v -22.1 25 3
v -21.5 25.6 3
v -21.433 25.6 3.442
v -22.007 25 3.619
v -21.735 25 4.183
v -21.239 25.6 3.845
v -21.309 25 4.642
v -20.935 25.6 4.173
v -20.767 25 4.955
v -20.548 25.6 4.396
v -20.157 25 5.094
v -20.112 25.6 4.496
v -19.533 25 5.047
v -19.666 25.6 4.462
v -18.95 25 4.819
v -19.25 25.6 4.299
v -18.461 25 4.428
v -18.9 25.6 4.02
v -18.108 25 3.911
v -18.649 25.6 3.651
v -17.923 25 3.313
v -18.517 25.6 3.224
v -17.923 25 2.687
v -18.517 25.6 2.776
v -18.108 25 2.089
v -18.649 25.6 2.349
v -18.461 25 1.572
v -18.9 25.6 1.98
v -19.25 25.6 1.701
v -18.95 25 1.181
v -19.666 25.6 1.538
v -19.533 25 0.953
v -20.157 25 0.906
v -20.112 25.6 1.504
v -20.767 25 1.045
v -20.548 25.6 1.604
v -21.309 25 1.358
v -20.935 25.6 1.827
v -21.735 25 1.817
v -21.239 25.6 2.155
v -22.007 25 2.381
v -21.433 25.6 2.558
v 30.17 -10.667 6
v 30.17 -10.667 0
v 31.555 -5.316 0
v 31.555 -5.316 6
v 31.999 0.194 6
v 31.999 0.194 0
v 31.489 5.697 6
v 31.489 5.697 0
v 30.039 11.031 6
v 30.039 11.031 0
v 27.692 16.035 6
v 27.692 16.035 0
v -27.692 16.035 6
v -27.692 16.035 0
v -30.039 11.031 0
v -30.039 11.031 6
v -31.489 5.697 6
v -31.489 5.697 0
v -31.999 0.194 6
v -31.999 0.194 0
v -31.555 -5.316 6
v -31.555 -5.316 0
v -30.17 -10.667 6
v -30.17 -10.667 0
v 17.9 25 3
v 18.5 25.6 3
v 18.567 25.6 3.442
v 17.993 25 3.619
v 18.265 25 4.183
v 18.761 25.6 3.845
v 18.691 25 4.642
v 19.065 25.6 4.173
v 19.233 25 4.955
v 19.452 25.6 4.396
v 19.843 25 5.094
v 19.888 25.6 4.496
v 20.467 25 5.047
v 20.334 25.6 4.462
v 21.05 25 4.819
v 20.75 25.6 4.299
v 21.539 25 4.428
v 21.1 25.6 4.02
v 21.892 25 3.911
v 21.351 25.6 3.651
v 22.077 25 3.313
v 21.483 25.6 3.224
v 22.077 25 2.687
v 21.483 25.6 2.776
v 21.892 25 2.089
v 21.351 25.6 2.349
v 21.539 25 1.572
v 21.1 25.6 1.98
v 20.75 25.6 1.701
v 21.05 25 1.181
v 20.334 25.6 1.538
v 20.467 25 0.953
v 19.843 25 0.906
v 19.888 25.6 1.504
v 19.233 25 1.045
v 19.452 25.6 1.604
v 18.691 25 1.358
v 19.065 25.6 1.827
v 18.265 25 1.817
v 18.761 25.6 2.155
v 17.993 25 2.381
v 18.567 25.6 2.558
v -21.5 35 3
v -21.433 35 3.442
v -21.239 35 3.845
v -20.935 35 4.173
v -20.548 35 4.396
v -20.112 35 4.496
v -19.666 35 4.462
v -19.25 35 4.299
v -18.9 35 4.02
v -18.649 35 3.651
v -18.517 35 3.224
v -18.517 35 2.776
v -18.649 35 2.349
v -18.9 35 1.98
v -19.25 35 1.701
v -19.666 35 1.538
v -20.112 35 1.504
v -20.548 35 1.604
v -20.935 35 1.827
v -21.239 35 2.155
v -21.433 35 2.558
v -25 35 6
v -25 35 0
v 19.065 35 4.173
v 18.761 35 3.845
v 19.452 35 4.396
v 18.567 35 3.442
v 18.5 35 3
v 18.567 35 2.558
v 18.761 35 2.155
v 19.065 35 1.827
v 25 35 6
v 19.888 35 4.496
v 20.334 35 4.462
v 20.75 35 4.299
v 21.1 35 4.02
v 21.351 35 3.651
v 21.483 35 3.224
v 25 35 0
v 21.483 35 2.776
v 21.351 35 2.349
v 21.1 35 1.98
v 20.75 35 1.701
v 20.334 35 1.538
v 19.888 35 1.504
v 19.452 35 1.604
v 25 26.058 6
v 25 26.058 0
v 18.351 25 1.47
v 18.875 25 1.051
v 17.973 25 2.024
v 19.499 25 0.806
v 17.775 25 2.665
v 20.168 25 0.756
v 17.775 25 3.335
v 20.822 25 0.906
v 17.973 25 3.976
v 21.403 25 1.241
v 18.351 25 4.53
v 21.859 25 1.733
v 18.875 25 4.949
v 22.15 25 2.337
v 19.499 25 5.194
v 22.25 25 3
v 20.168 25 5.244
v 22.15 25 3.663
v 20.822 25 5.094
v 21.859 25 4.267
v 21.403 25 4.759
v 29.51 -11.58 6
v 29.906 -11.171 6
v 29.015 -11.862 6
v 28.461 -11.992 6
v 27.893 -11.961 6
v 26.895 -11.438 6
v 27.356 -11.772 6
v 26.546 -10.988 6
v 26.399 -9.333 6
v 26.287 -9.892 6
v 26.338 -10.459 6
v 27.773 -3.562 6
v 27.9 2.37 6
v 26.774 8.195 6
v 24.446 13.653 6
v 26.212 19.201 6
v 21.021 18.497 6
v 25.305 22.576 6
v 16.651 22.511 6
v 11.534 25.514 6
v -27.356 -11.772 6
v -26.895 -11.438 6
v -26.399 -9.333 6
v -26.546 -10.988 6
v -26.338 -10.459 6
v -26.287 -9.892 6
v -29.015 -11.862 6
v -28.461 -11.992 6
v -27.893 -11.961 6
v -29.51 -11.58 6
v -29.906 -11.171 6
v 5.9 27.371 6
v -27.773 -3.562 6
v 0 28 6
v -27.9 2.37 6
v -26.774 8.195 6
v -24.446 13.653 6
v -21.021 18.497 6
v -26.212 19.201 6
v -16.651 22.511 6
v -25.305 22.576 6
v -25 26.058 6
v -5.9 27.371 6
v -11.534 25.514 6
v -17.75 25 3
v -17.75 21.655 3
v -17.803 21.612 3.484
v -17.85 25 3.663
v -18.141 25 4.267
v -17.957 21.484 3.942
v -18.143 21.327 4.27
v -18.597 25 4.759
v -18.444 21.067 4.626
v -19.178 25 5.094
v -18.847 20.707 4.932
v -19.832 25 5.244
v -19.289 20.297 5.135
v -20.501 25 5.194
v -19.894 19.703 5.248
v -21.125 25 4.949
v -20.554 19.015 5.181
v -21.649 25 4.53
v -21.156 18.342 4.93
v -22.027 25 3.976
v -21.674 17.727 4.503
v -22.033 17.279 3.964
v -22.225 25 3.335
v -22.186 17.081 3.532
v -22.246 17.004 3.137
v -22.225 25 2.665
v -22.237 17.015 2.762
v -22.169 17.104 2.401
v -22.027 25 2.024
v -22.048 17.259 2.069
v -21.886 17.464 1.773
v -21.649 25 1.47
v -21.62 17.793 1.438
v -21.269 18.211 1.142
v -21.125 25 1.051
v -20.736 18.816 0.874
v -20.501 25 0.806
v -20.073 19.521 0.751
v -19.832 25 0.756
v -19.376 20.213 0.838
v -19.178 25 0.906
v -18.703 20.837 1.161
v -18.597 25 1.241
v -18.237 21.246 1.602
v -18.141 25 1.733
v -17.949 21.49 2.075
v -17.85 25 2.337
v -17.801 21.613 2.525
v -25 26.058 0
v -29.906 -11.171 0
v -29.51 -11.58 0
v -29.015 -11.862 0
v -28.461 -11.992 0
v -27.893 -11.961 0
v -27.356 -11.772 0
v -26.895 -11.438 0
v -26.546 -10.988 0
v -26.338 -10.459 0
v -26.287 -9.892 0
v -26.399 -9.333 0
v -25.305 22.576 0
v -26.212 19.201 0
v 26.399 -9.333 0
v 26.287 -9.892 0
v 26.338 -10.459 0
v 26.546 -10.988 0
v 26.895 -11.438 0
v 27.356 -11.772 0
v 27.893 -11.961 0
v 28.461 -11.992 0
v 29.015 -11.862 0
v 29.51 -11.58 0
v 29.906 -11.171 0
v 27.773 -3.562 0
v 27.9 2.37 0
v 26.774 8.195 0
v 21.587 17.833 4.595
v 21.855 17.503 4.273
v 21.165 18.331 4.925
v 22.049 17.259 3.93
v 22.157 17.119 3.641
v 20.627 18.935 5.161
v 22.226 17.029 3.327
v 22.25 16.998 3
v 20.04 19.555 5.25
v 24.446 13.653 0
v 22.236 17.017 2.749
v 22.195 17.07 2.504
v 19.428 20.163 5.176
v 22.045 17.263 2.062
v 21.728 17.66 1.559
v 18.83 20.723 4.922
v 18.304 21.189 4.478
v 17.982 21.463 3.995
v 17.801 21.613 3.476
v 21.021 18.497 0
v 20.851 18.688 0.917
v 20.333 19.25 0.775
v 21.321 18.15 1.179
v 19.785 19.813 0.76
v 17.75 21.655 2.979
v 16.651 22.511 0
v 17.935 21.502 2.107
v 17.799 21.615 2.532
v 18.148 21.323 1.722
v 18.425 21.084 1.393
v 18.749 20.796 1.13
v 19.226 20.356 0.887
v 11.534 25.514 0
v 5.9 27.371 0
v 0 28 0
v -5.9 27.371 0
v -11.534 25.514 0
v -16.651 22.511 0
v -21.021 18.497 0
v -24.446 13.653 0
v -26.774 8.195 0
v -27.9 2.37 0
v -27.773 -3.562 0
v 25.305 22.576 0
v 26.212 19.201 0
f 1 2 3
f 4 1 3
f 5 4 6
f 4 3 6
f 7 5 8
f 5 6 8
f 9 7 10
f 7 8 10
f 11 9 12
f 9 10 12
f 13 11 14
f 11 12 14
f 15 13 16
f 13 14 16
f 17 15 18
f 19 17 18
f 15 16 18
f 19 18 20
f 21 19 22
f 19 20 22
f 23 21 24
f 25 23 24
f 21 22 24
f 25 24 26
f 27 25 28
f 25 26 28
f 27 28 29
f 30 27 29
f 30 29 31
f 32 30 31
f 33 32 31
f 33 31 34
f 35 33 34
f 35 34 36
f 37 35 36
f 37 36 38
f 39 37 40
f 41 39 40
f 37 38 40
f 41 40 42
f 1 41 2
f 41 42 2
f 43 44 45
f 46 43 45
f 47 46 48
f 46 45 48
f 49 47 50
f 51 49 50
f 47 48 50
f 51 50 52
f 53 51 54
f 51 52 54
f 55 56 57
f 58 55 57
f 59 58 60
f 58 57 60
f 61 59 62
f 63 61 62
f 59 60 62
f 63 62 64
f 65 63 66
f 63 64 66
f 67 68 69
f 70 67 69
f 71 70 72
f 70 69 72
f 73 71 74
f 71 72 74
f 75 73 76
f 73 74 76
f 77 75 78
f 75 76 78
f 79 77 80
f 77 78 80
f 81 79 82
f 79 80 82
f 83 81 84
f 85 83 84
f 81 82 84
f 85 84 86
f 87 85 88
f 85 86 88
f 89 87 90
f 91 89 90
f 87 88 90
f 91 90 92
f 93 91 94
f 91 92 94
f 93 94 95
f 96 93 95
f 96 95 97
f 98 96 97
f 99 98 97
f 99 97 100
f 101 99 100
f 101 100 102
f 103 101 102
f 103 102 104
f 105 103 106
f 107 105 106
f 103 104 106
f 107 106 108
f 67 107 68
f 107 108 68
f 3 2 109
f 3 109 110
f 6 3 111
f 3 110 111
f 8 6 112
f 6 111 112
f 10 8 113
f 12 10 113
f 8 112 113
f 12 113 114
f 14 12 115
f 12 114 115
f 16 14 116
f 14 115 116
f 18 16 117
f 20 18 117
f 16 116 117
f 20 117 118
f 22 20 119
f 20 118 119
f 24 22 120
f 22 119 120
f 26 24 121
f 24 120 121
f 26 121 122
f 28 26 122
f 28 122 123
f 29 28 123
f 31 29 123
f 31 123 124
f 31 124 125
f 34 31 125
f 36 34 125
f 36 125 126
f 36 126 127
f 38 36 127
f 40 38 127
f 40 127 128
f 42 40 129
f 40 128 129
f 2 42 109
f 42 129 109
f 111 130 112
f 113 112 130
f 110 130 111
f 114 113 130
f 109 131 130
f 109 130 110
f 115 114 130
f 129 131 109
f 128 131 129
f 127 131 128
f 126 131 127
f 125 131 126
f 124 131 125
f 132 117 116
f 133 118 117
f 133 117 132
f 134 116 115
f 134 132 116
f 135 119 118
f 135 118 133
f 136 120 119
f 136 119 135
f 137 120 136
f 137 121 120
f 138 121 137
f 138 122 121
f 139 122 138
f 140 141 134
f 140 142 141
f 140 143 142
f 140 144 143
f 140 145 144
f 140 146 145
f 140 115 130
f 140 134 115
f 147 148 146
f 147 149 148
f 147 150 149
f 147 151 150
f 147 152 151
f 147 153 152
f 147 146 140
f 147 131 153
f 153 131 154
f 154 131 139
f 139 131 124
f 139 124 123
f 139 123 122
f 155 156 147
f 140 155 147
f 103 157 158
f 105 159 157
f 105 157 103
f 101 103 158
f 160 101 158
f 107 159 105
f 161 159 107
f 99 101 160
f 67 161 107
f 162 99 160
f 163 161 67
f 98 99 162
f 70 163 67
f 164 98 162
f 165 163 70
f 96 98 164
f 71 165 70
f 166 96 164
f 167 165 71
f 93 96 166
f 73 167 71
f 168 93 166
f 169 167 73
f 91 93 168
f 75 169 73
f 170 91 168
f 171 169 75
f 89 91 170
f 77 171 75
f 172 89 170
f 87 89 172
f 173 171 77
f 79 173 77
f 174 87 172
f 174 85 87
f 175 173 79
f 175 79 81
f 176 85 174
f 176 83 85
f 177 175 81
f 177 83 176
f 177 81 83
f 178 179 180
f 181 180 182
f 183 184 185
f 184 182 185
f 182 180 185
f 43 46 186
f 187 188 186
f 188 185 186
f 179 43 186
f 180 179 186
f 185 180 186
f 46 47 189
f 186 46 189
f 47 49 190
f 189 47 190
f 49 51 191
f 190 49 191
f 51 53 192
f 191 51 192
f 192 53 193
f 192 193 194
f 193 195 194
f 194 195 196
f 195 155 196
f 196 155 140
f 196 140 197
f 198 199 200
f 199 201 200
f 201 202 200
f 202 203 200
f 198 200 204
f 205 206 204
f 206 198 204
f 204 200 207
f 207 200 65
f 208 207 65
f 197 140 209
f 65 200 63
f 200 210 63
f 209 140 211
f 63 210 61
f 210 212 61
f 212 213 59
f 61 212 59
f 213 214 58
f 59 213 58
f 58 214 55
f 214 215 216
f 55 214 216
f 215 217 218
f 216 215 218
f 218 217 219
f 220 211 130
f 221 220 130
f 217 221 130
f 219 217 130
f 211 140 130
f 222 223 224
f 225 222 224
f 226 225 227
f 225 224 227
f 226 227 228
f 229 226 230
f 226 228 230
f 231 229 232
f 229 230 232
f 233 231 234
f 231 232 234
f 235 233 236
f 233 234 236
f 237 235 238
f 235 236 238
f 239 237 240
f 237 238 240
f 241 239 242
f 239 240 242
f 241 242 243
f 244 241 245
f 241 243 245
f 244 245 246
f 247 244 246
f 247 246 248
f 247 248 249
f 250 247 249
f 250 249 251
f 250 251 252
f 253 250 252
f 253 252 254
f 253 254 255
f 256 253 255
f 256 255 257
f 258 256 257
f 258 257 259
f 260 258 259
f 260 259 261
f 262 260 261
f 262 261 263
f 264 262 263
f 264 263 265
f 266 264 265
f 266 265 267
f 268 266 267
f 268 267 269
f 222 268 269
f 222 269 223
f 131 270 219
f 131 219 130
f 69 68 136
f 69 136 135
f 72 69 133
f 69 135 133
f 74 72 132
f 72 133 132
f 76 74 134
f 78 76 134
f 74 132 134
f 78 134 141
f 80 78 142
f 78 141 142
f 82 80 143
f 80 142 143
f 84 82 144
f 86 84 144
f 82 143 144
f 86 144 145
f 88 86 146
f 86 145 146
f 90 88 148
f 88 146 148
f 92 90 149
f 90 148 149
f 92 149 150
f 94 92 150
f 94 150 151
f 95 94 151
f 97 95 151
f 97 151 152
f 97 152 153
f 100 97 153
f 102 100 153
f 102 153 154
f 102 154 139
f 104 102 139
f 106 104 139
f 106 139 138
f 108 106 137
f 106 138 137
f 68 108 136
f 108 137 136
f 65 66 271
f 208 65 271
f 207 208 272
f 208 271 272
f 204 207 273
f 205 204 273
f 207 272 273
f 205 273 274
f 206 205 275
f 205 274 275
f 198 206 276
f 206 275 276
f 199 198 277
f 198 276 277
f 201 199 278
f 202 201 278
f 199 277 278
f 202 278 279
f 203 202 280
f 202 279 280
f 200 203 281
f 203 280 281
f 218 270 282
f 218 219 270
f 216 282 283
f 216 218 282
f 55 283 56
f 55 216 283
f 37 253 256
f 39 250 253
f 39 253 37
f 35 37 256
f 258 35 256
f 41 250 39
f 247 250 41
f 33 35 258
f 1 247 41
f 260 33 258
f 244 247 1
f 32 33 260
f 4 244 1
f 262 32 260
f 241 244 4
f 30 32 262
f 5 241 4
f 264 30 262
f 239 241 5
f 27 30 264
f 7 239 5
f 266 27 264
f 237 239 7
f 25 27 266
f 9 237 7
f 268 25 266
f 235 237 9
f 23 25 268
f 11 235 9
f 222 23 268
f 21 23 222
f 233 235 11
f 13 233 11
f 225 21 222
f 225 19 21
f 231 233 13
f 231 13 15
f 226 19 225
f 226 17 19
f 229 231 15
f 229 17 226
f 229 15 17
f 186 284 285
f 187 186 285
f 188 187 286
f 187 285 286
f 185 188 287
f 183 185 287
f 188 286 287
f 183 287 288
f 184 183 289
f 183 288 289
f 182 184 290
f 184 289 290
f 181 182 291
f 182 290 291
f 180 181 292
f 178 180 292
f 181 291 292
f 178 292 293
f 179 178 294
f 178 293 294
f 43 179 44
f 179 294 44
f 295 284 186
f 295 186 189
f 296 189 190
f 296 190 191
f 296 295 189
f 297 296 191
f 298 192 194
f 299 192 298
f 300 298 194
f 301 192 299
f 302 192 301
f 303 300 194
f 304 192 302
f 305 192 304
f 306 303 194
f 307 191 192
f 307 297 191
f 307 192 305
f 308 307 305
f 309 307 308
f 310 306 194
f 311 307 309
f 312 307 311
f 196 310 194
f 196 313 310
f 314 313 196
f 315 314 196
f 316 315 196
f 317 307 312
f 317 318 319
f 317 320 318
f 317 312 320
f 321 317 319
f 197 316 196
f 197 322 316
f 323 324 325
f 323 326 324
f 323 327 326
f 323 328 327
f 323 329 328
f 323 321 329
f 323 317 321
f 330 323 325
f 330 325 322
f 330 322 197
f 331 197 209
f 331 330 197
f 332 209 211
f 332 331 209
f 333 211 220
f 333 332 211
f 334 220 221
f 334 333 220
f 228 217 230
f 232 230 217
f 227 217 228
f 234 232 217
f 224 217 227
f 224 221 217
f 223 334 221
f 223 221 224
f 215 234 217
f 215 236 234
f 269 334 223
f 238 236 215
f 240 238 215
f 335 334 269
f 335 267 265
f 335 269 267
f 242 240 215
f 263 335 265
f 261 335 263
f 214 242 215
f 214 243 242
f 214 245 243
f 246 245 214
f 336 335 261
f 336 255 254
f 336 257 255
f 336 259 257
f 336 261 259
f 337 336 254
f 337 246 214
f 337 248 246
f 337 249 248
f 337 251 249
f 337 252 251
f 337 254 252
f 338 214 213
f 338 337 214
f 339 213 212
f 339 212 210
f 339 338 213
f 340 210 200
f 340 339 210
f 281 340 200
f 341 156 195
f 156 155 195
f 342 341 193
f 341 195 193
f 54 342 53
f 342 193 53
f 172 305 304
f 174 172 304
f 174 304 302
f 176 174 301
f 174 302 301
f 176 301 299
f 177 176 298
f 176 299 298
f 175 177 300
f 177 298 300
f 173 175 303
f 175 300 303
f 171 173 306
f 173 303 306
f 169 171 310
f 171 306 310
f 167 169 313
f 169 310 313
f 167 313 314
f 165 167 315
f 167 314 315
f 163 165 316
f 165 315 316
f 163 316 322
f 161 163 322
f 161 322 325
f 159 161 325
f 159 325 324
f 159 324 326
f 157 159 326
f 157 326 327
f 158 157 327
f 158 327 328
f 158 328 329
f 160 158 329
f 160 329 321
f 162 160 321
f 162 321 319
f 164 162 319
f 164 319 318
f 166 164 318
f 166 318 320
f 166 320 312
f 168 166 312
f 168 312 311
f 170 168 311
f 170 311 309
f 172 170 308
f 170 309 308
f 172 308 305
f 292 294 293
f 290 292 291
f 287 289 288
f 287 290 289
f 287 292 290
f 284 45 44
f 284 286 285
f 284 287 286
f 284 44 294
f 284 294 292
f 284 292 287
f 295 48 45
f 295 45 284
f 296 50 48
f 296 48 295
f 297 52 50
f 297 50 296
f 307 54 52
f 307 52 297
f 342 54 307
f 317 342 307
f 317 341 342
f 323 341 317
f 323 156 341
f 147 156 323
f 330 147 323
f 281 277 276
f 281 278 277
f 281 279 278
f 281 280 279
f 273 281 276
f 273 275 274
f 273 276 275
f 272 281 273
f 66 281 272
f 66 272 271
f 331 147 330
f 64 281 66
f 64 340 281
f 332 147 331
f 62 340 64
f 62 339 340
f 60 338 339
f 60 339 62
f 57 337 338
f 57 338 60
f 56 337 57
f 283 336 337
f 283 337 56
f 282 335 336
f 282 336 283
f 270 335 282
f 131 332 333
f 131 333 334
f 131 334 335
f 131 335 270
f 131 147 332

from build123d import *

# Parameters (mm, degrees)
PAD_DEPTH        = 6
HOLE_D           = 3
HOLE_CBORE_D     = 4.5
HOLE_CBORE_DEPTH = 25
CHAMFER_SIZE     = 0.6
FILLET_R         = 20


with BuildPart() as part:
    # Sketch → Pad (new body)
    with BuildSketch(Plane.XY):
        with BuildLine():
            ThreePointArc((26.398653, -9.333333), (0, 28), (-26.398653, -9.333333))
            ThreePointArc((-30.169889, -10.666667), (-27.617605, -11.885618), (-26.398653, -9.333333))
            ThreePointArc((-25, 19.974984), (-31.554031, 5.323827), (-30.169889, -10.666667))
            Line((-25, 19.974984), (-25, 35))
            Line((-25, 35), (25, 35))
            Line((25, 19.974984), (25, 35))
            ThreePointArc((30.169889, -10.666667), (31.554031, 5.323827), (25, 19.974984))
            ThreePointArc((26.398653, -9.333333), (27.617605, -11.885618), (30.169889, -10.666667))
        make_face()
    extrude(amount=PAD_DEPTH)

    # Hole (through all)
    with Locations(Plane.XZ):
        with Locations((-20, 3), (20, 3)):
            CounterBoreHole(HOLE_D / 2, HOLE_CBORE_D / 2, HOLE_CBORE_DEPTH)

    # Chamfer
    chamfer_edges = [part.edges().sort_by_distance(p)[0] for p in [
        (21.5, 25, 3),
        (-18.5, 25, 3),
    ]]
    chamfer(chamfer_edges, length=CHAMFER_SIZE)

    # Fillet
    fillet_edges = [part.edges().sort_by_distance(p)[0] for p in [
        (-25, 19.974984, 3),
        (25, 19.974984, 3),
    ]]
    fillet(fillet_edges, radius=FILLET_R)


solid = part.part
